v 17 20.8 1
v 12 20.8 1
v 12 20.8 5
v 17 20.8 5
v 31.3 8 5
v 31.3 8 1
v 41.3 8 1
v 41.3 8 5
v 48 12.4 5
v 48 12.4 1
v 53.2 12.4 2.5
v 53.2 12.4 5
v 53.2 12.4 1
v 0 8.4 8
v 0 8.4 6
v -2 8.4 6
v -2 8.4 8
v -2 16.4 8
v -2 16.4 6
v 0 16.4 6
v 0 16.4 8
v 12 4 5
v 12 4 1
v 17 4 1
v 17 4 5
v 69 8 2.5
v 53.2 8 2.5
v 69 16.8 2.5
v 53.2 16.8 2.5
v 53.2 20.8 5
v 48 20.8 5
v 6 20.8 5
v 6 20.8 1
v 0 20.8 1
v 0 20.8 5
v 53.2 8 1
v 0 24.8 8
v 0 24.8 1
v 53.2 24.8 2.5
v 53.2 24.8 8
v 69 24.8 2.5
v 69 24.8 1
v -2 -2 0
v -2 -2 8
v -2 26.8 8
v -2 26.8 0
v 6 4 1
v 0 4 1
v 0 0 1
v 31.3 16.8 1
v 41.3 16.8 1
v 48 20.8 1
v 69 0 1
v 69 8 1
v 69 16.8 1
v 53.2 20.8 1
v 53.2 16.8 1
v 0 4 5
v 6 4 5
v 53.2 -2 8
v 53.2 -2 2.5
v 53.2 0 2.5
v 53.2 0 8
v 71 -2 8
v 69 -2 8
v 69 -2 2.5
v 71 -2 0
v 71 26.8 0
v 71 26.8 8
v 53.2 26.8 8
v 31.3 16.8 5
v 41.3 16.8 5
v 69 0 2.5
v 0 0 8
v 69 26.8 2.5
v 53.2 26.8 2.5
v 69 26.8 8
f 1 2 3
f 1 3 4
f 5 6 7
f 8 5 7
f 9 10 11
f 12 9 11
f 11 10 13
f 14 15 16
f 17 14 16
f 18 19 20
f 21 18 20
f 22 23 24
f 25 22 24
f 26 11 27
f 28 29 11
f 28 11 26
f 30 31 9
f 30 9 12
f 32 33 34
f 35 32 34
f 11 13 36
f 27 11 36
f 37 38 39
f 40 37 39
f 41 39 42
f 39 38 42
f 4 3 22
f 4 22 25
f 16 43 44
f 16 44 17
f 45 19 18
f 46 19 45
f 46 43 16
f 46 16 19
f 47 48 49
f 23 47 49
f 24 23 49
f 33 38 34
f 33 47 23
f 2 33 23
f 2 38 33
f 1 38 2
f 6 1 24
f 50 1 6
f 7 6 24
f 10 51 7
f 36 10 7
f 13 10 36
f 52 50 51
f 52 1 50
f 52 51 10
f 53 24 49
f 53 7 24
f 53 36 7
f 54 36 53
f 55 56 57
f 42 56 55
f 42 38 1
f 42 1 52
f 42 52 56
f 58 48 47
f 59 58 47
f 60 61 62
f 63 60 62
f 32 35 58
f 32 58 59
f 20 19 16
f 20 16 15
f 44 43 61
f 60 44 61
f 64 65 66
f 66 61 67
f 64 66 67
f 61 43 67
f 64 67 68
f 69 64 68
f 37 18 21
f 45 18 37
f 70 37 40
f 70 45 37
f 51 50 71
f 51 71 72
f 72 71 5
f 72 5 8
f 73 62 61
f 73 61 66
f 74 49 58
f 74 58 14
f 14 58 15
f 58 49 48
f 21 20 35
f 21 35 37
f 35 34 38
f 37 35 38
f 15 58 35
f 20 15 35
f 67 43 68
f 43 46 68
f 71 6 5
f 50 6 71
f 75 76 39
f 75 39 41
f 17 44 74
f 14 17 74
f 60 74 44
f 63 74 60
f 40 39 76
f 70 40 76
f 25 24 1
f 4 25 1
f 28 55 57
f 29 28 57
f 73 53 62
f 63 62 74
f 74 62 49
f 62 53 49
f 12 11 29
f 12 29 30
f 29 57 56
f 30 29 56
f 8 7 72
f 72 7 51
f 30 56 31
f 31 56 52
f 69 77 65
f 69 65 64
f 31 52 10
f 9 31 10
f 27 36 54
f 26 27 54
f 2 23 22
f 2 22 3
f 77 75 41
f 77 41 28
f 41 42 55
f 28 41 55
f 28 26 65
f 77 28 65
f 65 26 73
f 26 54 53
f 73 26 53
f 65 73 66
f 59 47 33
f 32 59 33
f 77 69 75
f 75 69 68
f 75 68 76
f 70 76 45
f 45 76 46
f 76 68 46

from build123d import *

# Parameters (mm, degrees)
F0_W     = 5
F0_H     = 16.8
F0_W_2   = 10
F0_H_2   = 8.8
F0_W_3   = 15.8
F0_H_3   = 8
F1_DEPTH = 1
F0_H_4   = 2
F2_DEPTH = 2.5
F3_DEPTH = 5
F4_DEPTH = 8
F0_W_4   = 2
F5_DEPTH = 6


with BuildPart() as f1:
    # F0 (on Top) → F1 (new body)
    with BuildSketch(Plane.XY):
        Polygon((69, 24.8), (53.2, 24.8), (53.2, 20.8), (53.2, 16.8), (69, 16.8), align=None)
        Polygon((0, 24.8), (0, 20.8), (6, 20.8), (6, 4), (0, 4), (0, 0), (53.2, 0), (53.2, 8), (53.2, 12.4), (48, 12.4), (48, 20.8), (53.2, 20.8), (53.2, 24.8), align=None)
        with Locations((14.5, 12.4)):
            Rectangle(F0_W, F0_H, mode=Mode.SUBTRACT)
        with Locations((36.3, 12.4)):
            Rectangle(F0_W_2, F0_H_2, mode=Mode.SUBTRACT)
        with Locations((61.1, 4)):
            Rectangle(F0_W_3, F0_H_3)
    extrude(amount=F1_DEPTH)

    # F0 (on Top) → F2 (join)
    with BuildSketch(Plane.XY):
        with Locations((61.1, 25.8)):
            Rectangle(F0_W_3, F0_H_4)
        Polygon((69, 8), (69, 16.8), (53.2, 16.8), (53.2, 12.4), (53.2, 8), align=None)
        with Locations((61.1, -1)):
            Rectangle(F0_W_3, F0_H_4)
    extrude(amount=F2_DEPTH)

    # F0 (on Top) → F3 (join)
    with BuildSketch(Plane.XY):
        Polygon((6, 20.8), (0, 20.8), (0, 16.4), (0, 8.4), (0, 4), (6, 4), align=None)
        with Locations((14.5, 12.4)):
            Rectangle(F0_W, F0_H)
        with Locations((36.3, 12.4)):
            Rectangle(F0_W_2, F0_H_2)
        Polygon((53.2, 16.8), (53.2, 20.8), (48, 20.8), (48, 12.4), (53.2, 12.4), align=None)
    extrude(amount=F3_DEPTH)

    # F0 (on Top) → F4 (join)
    with BuildSketch(Plane.XY):
        Polygon((0, 16.4), (0, 20.8), (0, 24.8), (53.2, 24.8), (53.2, 26.8), (-2, 26.8), (-2, 16.4), align=None)
        Polygon((69, 26.8), (69, 24.8), (69, 16.8), (69, 8), (69, 0), (69, -2), (71, -2), (71, 26.8), align=None)
        Polygon((0, 4), (0, 8.4), (-2, 8.4), (-2, -2), (53.2, -2), (53.2, 0), (0, 0), align=None)
    extrude(amount=F4_DEPTH)

    # F0 (on Top) → F5 (join)
    with BuildSketch(Plane.XY):
        with Locations((-1, 12.4)):
            Rectangle(F0_W_4, F0_H_3)
    extrude(amount=F5_DEPTH)


solid = f1.part
